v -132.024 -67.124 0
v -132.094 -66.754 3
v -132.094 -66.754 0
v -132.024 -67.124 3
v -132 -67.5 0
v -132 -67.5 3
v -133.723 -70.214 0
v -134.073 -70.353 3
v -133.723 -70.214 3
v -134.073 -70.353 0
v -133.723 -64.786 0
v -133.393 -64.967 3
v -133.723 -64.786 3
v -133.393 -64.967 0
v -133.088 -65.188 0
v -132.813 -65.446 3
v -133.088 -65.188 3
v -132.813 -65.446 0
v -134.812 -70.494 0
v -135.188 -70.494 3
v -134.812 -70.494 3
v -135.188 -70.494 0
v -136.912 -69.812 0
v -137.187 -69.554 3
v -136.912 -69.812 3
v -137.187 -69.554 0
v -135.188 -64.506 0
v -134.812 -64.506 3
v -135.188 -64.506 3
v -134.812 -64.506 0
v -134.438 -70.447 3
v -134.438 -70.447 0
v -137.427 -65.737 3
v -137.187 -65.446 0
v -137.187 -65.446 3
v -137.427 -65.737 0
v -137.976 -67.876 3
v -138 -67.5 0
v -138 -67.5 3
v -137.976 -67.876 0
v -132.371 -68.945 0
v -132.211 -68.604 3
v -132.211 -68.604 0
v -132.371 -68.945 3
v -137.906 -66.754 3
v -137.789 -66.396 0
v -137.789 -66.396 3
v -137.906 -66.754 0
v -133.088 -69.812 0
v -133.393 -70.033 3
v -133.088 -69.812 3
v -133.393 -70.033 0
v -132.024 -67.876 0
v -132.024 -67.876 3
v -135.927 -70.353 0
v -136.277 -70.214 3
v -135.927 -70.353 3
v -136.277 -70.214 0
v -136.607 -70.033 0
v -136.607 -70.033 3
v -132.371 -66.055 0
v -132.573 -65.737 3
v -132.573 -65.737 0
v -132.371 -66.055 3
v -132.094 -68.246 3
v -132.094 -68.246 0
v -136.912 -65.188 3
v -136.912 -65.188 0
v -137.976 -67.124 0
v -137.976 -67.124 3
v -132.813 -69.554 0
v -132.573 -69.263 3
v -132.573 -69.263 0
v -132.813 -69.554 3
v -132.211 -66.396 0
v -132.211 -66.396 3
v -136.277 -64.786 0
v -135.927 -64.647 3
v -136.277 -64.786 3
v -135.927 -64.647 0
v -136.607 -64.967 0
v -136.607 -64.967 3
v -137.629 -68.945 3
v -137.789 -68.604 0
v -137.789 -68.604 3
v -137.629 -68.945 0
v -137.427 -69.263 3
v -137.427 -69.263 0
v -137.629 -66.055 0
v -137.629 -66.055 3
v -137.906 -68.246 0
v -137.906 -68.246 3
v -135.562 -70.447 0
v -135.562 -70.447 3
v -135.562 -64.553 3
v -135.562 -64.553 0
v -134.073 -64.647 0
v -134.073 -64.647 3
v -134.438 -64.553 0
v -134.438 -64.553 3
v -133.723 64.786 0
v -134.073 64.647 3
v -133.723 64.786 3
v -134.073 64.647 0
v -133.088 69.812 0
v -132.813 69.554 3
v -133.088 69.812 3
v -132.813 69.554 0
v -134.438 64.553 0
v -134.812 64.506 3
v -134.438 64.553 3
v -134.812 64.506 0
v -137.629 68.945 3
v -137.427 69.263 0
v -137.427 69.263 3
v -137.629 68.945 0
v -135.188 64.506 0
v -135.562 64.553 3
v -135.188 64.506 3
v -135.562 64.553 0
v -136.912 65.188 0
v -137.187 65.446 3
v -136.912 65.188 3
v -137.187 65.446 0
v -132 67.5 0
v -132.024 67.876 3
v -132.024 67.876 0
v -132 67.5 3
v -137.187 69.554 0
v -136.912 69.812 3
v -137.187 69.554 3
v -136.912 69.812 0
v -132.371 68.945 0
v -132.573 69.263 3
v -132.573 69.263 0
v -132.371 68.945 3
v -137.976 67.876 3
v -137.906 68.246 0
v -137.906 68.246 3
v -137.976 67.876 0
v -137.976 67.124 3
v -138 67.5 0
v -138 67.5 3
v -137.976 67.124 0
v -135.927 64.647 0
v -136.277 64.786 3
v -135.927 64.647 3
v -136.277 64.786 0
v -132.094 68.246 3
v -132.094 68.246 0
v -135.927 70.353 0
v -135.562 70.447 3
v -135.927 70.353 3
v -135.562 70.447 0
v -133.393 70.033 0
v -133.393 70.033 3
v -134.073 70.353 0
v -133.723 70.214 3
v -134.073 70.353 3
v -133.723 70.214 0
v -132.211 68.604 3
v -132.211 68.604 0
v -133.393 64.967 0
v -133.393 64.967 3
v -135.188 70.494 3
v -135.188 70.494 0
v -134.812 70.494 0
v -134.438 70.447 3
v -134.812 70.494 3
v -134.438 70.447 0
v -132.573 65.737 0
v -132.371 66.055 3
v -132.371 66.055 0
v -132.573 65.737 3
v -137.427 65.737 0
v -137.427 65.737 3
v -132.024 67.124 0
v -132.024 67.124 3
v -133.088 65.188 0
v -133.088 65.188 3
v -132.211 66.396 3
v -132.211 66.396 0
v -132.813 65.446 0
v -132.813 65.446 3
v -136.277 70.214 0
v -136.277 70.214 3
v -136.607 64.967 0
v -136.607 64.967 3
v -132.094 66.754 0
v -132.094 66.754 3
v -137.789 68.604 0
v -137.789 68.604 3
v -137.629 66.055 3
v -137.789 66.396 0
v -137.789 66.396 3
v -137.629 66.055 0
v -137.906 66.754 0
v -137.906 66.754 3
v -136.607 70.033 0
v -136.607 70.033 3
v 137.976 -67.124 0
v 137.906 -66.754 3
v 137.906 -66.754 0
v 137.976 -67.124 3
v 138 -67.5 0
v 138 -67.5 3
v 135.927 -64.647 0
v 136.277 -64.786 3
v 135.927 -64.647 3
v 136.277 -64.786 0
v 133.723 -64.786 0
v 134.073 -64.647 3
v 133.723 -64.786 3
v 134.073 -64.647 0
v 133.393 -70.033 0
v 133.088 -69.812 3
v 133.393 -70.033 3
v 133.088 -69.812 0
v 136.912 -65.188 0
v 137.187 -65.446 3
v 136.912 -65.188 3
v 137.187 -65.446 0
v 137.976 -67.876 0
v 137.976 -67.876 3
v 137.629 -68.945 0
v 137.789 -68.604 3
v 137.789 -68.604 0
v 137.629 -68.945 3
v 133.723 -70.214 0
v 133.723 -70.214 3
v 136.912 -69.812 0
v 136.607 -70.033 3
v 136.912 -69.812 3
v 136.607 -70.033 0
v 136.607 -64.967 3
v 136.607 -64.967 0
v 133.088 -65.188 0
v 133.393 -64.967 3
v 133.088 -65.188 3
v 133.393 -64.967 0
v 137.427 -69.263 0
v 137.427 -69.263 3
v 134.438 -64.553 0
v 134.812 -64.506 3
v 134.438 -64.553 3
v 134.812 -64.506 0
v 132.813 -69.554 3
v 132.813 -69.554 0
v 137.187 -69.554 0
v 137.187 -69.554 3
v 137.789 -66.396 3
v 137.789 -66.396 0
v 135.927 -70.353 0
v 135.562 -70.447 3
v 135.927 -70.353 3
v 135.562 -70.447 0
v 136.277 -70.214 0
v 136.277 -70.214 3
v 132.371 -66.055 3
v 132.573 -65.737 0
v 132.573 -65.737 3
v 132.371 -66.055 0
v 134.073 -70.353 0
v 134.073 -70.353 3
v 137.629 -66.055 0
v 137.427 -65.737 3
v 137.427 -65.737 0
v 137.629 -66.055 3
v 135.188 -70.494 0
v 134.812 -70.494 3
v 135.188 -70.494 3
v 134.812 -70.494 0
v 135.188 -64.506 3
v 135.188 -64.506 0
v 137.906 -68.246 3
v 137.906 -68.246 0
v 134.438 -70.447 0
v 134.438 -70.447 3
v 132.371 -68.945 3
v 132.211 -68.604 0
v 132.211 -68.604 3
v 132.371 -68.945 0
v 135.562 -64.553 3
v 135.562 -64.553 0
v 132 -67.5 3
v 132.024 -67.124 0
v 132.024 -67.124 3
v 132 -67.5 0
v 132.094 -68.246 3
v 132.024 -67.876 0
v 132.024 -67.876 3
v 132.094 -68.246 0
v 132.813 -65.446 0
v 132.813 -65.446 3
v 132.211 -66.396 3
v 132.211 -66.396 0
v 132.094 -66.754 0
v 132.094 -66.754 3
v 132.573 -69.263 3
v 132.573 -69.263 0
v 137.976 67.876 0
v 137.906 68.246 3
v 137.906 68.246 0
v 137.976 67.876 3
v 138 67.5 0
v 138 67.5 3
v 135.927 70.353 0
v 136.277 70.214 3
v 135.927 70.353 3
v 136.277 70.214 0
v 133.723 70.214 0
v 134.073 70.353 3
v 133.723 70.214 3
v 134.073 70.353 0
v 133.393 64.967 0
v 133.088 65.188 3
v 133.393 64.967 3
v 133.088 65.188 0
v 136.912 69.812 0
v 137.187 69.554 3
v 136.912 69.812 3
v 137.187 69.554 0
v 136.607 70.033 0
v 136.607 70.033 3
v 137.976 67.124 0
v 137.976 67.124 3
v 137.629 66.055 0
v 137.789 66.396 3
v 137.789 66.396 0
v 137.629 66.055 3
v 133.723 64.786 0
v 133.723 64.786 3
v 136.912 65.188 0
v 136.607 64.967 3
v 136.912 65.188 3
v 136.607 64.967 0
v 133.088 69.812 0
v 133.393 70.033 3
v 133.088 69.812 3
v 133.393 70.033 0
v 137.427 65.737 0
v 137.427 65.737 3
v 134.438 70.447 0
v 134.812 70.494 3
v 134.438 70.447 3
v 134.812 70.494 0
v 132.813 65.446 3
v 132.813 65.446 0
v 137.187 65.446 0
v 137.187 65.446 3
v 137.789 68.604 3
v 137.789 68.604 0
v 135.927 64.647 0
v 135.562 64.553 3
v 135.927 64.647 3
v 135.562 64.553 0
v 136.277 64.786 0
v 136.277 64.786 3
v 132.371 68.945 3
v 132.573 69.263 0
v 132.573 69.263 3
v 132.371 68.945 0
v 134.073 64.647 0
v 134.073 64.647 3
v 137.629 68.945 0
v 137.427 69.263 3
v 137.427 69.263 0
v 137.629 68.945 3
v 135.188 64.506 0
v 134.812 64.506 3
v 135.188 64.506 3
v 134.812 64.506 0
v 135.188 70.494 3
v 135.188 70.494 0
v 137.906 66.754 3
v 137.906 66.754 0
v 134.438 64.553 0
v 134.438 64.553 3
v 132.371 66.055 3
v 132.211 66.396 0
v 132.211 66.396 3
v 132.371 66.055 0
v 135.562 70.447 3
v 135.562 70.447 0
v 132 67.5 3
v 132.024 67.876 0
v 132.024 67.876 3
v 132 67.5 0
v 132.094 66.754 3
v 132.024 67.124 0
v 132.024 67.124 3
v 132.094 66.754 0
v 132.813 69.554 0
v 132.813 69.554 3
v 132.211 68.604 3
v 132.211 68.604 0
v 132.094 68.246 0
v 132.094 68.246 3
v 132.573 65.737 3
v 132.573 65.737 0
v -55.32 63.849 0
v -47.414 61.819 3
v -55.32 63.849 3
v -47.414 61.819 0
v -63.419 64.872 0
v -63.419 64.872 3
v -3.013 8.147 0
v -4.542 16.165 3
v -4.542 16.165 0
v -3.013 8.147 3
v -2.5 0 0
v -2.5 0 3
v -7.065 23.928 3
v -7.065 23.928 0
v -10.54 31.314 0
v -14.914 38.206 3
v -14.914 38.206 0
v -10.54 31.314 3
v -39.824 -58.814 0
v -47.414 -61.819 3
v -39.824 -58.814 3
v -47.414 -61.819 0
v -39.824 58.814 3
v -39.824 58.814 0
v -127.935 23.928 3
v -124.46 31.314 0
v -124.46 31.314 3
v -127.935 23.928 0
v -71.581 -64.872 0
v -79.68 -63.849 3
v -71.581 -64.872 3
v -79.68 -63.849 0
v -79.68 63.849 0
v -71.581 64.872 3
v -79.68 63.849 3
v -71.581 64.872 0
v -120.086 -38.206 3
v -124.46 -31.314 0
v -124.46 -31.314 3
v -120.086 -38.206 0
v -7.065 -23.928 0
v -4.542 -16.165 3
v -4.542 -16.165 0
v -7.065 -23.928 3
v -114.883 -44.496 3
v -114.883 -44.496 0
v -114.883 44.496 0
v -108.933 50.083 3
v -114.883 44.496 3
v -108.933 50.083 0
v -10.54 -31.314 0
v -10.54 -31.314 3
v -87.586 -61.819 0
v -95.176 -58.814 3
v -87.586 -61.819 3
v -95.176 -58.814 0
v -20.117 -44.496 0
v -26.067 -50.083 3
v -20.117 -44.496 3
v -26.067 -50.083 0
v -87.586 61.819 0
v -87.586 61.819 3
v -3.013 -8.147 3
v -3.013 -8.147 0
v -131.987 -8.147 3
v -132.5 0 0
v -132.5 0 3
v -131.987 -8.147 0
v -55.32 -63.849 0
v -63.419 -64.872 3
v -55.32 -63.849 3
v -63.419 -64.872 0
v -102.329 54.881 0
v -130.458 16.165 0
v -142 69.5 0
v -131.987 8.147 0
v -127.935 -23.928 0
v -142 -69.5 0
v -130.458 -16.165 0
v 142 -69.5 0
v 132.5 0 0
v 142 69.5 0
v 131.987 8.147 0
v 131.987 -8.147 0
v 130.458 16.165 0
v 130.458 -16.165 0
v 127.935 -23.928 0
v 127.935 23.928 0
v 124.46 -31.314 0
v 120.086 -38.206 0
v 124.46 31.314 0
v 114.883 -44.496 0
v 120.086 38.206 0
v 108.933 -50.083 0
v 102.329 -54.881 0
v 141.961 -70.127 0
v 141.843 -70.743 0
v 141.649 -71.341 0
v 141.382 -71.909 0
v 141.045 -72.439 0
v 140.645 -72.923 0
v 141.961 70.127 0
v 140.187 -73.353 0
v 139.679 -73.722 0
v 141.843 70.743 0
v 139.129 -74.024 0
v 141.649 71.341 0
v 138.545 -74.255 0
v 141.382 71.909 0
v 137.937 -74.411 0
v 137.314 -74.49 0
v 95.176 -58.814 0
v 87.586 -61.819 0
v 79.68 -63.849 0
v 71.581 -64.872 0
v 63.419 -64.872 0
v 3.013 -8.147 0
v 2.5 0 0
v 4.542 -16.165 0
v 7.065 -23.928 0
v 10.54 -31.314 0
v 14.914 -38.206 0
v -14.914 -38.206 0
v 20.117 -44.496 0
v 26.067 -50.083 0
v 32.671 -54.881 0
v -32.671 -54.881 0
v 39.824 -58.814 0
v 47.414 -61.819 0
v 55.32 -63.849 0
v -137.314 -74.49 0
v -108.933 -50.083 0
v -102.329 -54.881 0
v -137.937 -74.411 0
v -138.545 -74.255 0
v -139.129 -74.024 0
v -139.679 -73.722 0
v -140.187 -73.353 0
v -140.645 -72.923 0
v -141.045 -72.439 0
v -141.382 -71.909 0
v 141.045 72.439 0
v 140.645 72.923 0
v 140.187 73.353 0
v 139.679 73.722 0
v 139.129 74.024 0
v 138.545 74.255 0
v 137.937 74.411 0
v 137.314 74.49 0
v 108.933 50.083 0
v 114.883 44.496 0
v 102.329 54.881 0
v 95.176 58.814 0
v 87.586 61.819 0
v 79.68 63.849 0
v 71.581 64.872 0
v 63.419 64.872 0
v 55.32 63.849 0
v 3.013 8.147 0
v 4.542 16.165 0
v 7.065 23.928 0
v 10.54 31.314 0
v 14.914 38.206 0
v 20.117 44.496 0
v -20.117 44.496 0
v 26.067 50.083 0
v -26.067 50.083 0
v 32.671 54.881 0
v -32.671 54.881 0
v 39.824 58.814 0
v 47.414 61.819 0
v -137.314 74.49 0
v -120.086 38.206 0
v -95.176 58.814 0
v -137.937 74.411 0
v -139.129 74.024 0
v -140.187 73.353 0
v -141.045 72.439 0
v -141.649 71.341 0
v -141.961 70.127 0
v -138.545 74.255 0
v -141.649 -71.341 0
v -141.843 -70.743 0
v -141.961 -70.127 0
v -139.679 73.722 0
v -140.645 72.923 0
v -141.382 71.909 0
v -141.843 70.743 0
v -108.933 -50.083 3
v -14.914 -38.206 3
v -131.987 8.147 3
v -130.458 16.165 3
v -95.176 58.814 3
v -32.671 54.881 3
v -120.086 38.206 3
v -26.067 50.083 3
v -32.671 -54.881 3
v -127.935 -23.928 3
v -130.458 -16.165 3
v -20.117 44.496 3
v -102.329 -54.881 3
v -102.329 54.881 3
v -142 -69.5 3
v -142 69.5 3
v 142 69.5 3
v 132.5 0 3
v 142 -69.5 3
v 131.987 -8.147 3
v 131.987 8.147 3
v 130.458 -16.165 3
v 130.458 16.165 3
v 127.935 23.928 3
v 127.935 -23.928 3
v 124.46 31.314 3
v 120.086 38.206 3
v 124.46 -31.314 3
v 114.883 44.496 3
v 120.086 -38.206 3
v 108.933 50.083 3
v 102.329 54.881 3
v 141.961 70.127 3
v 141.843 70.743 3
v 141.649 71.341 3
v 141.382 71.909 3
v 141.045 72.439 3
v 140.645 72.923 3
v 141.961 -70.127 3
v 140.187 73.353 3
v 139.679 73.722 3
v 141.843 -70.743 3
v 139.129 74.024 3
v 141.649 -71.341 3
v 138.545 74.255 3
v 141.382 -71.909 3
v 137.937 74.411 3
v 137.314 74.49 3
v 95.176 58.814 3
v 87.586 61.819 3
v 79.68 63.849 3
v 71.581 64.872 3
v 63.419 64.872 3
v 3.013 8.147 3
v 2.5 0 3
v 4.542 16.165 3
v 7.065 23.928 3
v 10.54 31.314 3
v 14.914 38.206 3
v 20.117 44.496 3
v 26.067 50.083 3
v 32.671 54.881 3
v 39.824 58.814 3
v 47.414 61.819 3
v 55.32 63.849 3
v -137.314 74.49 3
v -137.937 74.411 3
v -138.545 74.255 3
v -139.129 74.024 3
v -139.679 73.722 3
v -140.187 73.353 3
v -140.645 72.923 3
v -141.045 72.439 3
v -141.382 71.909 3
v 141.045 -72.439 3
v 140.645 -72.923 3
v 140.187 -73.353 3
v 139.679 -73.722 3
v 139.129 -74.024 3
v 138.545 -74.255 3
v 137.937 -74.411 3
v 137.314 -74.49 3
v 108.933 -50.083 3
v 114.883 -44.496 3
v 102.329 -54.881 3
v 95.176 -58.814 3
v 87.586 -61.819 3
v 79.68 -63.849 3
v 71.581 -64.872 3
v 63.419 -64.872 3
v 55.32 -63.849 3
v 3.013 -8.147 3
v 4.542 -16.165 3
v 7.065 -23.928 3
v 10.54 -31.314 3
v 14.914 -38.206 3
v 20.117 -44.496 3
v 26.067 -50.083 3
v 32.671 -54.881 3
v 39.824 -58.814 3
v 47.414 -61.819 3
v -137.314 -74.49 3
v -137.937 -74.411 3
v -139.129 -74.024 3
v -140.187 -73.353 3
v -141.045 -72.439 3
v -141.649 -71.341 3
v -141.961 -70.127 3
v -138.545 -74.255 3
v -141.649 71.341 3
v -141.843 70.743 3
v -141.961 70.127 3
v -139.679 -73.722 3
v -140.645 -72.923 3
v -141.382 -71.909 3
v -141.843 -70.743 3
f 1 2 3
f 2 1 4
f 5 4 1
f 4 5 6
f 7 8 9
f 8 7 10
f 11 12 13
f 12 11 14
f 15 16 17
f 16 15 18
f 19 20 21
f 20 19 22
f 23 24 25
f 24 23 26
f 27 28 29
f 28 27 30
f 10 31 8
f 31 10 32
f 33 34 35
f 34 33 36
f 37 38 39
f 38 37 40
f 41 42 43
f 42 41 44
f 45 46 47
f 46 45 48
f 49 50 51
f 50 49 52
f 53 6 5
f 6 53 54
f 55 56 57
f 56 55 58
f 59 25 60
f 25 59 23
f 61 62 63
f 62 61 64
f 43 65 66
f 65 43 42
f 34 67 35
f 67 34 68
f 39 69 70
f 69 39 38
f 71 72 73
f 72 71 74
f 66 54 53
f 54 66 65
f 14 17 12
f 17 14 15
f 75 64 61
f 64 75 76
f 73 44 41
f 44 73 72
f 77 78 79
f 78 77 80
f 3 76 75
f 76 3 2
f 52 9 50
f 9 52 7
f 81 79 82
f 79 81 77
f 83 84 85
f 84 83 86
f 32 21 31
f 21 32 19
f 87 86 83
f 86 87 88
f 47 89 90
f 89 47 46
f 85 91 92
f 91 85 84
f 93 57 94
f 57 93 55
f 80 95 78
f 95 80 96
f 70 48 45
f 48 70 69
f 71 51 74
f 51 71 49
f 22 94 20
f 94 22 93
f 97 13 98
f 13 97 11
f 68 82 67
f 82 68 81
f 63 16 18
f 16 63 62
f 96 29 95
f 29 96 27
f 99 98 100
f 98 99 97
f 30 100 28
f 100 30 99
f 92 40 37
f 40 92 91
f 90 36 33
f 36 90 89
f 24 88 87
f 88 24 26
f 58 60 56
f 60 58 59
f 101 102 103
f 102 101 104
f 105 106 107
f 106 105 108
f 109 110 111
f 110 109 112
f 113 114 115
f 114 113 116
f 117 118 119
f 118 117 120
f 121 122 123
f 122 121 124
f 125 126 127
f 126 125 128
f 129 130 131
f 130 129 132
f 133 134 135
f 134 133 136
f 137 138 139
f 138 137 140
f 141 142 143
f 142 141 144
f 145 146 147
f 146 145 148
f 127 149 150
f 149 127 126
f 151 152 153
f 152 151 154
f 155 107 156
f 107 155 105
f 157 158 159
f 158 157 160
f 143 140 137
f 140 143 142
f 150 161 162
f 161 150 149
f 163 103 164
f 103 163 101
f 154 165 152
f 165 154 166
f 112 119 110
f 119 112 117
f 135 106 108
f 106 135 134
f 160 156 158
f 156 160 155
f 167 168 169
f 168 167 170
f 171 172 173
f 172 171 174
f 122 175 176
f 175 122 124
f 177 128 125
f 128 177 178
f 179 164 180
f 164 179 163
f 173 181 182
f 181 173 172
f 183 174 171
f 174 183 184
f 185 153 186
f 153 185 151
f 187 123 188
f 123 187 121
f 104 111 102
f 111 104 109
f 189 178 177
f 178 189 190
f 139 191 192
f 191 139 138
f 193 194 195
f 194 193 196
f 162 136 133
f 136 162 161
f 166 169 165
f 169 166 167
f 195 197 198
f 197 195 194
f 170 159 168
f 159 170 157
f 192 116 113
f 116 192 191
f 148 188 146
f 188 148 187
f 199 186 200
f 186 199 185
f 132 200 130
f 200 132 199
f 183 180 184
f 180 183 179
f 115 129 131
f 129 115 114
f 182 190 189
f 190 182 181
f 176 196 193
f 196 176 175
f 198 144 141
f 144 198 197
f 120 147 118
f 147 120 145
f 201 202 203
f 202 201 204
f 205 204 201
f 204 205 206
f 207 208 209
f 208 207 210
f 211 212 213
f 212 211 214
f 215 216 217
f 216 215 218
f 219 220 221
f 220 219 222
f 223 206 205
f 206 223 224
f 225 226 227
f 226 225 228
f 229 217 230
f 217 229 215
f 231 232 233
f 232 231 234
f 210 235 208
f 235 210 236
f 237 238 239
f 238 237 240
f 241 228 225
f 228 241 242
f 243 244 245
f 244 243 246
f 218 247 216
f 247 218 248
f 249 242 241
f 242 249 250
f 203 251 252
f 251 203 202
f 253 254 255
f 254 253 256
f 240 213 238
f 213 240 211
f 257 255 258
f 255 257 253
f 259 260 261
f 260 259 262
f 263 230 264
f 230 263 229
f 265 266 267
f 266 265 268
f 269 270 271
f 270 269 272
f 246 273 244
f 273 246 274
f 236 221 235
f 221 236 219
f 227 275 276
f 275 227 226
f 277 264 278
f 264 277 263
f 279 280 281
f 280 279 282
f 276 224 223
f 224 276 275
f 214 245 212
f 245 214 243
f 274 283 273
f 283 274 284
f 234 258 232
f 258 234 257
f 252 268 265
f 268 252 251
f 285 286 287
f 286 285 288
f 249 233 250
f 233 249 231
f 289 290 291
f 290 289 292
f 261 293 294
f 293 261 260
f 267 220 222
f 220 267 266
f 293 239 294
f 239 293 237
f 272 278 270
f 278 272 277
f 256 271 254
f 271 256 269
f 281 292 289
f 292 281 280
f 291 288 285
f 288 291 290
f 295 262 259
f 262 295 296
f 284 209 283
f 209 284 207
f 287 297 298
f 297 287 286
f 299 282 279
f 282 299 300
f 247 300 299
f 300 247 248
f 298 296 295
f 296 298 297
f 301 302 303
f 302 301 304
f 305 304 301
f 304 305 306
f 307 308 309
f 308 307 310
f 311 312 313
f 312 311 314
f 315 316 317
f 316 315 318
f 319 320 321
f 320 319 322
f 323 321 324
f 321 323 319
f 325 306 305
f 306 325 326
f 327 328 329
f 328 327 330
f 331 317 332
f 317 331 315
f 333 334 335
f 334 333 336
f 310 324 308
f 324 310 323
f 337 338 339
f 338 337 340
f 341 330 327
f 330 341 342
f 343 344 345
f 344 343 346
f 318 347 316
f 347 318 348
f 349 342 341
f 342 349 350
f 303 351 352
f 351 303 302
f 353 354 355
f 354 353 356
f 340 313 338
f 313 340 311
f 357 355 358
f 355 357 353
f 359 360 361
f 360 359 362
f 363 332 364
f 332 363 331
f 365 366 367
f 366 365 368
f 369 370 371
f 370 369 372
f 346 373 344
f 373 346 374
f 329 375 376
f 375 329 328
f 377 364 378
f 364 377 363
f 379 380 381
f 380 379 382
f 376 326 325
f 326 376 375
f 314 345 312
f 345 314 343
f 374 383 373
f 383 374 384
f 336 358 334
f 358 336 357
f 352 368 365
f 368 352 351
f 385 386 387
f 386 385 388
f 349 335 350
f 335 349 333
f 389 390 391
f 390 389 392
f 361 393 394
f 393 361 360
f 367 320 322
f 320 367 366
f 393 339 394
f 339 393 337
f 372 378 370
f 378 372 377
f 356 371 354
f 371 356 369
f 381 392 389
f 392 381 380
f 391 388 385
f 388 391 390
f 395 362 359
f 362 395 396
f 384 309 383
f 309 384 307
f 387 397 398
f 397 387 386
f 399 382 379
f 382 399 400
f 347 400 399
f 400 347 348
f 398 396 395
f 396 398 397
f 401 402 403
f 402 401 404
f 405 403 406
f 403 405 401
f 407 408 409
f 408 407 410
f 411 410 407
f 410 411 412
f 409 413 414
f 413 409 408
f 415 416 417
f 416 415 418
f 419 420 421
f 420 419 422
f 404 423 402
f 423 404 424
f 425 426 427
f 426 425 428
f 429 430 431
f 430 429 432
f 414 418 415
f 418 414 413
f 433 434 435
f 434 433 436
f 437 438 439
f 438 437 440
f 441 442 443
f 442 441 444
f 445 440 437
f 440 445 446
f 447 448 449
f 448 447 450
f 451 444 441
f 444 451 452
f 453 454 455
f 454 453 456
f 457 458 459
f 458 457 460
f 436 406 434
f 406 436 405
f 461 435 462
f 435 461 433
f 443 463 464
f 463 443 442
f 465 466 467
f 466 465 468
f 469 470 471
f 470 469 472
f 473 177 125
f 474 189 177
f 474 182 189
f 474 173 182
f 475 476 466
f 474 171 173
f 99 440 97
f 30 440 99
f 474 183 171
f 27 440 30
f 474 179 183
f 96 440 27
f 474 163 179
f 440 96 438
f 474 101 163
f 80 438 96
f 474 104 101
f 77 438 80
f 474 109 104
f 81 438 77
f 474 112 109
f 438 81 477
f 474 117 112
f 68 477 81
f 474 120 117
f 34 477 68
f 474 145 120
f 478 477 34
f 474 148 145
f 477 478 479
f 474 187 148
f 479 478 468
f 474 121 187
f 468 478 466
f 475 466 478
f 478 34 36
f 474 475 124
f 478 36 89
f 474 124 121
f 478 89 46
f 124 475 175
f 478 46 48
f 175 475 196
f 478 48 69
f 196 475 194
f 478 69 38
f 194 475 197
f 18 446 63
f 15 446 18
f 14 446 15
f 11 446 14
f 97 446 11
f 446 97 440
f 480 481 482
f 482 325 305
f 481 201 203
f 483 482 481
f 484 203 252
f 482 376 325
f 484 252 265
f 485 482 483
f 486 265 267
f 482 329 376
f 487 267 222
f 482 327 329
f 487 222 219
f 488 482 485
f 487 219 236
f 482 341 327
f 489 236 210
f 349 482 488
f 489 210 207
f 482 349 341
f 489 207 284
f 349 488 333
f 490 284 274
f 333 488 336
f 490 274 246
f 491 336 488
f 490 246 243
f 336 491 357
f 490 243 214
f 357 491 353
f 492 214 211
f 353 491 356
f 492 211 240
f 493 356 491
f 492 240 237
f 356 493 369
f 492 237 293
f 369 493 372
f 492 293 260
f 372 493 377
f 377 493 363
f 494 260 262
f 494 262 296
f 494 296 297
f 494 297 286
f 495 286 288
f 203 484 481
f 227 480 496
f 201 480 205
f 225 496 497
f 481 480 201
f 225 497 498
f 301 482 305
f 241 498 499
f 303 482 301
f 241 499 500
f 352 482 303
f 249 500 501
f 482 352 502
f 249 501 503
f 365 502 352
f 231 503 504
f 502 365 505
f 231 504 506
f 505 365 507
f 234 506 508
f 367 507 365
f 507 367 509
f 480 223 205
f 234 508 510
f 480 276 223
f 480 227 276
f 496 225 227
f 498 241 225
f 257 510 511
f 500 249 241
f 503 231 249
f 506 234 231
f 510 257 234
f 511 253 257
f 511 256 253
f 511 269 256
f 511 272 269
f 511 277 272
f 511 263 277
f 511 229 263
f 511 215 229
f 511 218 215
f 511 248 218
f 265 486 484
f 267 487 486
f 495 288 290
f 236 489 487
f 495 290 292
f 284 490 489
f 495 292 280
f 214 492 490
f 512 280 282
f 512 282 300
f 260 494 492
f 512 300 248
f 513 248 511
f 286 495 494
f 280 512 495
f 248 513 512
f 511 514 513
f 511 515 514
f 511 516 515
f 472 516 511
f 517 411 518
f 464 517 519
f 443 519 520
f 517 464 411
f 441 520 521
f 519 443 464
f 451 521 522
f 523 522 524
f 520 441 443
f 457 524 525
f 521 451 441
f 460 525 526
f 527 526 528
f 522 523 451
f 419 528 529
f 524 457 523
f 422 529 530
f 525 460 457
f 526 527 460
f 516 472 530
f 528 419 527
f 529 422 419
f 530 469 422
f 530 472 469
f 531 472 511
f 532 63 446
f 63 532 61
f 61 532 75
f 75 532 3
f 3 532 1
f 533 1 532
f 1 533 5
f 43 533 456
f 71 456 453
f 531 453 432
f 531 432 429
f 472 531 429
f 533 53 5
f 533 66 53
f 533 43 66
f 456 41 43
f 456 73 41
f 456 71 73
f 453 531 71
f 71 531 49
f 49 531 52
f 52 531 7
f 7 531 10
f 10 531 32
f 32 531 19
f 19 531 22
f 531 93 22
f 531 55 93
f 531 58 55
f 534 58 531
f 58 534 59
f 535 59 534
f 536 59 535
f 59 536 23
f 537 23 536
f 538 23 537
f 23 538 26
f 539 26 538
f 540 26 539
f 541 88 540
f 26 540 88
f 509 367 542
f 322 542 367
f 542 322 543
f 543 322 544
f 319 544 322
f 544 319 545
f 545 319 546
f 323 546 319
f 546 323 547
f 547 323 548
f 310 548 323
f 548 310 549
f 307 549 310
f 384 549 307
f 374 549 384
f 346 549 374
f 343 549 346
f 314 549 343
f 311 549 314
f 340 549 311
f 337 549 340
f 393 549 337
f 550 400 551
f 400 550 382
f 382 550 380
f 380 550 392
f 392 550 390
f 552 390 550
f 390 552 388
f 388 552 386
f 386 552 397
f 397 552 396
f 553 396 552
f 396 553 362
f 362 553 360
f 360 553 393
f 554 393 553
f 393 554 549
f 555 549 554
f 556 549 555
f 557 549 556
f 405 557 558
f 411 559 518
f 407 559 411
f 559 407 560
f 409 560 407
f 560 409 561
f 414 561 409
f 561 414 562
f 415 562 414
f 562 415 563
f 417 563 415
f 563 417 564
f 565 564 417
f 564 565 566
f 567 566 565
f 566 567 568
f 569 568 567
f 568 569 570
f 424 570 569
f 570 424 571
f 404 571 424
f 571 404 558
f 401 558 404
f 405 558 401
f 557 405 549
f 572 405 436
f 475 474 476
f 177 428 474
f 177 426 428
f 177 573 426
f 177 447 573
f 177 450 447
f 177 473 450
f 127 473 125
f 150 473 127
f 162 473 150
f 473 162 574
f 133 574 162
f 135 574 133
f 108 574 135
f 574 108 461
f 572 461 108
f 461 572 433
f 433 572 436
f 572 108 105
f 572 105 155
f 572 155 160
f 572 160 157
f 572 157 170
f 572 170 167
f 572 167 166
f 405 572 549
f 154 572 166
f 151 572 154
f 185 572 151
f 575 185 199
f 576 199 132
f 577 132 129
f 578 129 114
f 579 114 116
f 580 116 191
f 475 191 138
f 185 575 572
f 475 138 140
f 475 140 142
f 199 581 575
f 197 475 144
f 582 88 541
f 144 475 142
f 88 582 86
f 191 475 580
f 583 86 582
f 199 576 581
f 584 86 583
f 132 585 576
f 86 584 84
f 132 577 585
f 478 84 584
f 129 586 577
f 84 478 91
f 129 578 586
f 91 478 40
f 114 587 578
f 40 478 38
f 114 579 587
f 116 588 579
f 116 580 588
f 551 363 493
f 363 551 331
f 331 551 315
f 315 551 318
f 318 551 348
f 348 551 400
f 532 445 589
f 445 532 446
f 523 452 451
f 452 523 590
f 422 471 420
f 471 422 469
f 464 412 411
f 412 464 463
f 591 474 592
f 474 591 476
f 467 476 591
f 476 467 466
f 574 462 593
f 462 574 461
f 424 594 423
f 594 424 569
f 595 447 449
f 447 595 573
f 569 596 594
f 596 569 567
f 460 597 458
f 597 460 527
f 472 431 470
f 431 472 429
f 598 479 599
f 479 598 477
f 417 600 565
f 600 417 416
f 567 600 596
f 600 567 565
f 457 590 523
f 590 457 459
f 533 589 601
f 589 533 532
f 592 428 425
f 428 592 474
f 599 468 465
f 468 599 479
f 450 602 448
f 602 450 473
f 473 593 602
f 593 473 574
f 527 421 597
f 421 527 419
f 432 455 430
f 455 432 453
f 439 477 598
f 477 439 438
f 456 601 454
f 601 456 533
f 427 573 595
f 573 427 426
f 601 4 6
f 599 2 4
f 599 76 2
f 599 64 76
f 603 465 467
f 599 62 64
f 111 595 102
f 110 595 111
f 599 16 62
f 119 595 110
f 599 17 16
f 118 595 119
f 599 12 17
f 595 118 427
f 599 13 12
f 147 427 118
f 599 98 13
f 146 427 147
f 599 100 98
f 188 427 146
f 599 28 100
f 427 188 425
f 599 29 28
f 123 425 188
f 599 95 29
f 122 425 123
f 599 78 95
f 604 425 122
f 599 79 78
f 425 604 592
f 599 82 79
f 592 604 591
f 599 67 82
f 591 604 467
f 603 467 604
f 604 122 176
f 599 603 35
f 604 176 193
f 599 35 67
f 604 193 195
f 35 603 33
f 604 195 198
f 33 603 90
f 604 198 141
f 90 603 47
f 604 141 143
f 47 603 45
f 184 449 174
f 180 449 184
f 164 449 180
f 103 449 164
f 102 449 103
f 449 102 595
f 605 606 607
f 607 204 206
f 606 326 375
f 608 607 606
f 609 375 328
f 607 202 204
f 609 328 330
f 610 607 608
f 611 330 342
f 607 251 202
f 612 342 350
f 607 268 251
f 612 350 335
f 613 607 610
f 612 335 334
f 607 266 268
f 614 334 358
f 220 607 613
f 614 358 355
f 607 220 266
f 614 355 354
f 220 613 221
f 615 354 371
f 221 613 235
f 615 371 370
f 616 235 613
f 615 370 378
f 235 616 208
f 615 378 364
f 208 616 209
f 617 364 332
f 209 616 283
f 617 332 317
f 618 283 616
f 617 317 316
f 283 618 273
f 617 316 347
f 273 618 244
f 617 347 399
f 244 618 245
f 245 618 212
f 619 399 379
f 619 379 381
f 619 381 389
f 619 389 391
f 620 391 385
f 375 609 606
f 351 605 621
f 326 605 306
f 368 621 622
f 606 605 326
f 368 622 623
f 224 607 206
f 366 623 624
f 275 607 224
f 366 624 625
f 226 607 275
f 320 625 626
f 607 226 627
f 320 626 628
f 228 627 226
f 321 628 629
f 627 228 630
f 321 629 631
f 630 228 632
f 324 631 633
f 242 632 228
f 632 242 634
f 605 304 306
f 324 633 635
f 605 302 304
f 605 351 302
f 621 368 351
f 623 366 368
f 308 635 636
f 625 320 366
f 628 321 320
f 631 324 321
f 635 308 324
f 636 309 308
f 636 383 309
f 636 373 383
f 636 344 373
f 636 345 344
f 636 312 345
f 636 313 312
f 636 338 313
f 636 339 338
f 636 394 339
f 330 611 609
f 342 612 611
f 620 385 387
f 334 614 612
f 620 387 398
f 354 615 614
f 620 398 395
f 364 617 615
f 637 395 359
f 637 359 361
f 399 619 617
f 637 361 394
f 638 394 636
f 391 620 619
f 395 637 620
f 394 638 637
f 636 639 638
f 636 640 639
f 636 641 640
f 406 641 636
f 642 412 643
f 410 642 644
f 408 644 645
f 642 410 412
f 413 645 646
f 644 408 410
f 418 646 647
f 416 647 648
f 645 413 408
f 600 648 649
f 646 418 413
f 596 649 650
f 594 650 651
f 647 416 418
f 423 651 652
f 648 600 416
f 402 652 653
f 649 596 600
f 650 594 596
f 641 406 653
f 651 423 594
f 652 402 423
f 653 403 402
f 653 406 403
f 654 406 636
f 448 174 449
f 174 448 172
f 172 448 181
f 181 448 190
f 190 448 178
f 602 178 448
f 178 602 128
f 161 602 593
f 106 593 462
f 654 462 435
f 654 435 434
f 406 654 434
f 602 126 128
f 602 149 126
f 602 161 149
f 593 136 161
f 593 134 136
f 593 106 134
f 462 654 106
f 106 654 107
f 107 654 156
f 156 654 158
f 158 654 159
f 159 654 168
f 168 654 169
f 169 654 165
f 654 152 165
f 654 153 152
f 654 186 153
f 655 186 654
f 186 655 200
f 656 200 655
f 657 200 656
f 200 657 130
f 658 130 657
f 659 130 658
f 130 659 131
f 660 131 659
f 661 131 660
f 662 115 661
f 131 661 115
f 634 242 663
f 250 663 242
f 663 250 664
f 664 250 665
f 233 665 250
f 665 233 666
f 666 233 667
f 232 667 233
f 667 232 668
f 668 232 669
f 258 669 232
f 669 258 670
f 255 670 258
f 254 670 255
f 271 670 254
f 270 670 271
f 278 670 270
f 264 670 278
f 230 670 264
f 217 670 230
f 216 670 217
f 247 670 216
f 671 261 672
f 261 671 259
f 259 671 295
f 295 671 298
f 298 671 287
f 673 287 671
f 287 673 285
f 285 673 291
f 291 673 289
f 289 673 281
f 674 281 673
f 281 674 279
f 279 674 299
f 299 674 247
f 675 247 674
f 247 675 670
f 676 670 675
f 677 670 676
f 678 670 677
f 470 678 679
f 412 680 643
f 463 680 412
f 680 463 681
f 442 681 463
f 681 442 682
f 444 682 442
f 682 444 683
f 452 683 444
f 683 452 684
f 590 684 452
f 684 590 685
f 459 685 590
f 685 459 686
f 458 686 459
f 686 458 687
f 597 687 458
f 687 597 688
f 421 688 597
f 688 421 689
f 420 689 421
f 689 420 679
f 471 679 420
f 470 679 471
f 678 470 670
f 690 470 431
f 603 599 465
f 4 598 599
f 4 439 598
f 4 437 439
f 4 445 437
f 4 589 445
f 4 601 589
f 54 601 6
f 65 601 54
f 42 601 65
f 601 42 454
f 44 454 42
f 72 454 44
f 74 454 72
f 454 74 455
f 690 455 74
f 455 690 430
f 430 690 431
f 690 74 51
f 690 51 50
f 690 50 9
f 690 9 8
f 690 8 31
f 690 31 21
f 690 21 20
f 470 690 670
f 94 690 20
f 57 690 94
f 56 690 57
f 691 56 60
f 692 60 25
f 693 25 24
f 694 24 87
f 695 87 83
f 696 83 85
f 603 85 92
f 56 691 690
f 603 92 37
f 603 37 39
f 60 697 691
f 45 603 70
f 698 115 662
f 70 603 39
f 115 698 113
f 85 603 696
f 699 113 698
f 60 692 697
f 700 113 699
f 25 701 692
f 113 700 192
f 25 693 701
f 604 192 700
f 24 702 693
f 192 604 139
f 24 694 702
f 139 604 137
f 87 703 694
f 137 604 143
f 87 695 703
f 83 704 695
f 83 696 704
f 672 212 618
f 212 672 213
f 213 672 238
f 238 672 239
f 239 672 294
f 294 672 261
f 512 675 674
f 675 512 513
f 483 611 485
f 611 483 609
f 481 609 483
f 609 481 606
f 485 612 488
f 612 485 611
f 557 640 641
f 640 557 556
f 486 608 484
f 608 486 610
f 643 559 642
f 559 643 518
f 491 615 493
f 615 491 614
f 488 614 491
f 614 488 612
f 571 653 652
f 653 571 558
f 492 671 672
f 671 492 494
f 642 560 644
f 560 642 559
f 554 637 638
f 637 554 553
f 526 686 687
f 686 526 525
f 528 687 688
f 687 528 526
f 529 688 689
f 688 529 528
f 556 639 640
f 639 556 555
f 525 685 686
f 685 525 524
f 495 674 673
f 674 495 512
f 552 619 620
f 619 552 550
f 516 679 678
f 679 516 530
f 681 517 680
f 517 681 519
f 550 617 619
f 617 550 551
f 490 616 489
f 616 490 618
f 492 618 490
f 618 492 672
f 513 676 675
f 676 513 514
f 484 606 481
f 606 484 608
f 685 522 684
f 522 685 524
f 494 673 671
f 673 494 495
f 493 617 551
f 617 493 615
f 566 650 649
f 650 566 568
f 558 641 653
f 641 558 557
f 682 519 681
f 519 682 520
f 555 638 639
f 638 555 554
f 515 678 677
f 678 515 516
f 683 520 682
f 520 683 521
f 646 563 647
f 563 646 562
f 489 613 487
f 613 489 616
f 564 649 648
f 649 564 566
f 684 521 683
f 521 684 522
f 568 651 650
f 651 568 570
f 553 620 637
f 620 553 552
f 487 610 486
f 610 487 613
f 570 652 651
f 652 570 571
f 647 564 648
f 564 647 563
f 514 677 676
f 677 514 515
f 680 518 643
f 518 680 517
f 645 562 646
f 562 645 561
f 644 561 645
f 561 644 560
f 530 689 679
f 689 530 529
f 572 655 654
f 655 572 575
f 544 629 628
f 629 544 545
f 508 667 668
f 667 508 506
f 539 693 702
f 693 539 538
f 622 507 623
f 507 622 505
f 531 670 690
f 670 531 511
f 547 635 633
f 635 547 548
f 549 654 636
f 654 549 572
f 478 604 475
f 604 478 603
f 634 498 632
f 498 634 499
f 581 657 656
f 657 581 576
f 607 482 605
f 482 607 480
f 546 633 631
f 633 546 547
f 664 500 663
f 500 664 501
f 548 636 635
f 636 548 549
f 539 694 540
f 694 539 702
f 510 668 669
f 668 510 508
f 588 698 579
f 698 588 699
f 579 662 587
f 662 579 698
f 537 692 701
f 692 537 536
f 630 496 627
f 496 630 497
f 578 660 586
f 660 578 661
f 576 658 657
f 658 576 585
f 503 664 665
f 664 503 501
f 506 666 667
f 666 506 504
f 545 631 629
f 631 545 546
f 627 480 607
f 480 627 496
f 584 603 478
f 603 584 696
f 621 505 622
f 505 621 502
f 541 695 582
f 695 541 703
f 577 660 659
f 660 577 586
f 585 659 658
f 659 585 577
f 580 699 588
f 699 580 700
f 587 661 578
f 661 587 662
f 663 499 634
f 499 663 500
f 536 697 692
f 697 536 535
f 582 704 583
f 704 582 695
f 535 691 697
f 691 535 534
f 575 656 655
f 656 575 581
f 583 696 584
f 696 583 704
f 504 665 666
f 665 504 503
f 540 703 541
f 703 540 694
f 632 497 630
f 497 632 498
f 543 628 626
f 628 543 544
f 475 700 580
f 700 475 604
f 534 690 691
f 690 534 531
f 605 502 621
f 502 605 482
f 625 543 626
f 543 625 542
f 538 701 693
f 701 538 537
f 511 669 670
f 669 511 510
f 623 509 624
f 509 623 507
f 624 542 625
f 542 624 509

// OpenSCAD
$fn = 50;


difference() {
	union() {
		hull() {
			translate(v = [-137.0000000000, 69.5000000000, 0]) {
				cylinder(h = 3, r = 5);
			}
			translate(v = [137.0000000000, 69.5000000000, 0]) {
				cylinder(h = 3, r = 5);
			}
			translate(v = [-137.0000000000, -69.5000000000, 0]) {
				cylinder(h = 3, r = 5);
			}
			translate(v = [137.0000000000, -69.5000000000, 0]) {
				cylinder(h = 3, r = 5);
			}
		}
	}
	union() {
		#translate(v = [-135.0000000000, -67.5000000000, -100.0000000000]) {
			cylinder(h = 200, r = 3.0000000000);
		}
		#translate(v = [-135.0000000000, 67.5000000000, -100.0000000000]) {
			cylinder(h = 200, r = 3.0000000000);
		}
		#translate(v = [135.0000000000, -67.5000000000, -100.0000000000]) {
			cylinder(h = 200, r = 3.0000000000);
		}
		#translate(v = [135.0000000000, 67.5000000000, -100.0000000000]) {
			cylinder(h = 200, r = 3.0000000000);
		}
		#translate(v = [-67.5000000000, 0, 0]) {
			cylinder(h = 3, r = 65.0000000000);
		}
		#translate(v = [67.5000000000, 0, 0]) {
			cylinder(h = 3, r = 65.0000000000);
		}
	}
}
